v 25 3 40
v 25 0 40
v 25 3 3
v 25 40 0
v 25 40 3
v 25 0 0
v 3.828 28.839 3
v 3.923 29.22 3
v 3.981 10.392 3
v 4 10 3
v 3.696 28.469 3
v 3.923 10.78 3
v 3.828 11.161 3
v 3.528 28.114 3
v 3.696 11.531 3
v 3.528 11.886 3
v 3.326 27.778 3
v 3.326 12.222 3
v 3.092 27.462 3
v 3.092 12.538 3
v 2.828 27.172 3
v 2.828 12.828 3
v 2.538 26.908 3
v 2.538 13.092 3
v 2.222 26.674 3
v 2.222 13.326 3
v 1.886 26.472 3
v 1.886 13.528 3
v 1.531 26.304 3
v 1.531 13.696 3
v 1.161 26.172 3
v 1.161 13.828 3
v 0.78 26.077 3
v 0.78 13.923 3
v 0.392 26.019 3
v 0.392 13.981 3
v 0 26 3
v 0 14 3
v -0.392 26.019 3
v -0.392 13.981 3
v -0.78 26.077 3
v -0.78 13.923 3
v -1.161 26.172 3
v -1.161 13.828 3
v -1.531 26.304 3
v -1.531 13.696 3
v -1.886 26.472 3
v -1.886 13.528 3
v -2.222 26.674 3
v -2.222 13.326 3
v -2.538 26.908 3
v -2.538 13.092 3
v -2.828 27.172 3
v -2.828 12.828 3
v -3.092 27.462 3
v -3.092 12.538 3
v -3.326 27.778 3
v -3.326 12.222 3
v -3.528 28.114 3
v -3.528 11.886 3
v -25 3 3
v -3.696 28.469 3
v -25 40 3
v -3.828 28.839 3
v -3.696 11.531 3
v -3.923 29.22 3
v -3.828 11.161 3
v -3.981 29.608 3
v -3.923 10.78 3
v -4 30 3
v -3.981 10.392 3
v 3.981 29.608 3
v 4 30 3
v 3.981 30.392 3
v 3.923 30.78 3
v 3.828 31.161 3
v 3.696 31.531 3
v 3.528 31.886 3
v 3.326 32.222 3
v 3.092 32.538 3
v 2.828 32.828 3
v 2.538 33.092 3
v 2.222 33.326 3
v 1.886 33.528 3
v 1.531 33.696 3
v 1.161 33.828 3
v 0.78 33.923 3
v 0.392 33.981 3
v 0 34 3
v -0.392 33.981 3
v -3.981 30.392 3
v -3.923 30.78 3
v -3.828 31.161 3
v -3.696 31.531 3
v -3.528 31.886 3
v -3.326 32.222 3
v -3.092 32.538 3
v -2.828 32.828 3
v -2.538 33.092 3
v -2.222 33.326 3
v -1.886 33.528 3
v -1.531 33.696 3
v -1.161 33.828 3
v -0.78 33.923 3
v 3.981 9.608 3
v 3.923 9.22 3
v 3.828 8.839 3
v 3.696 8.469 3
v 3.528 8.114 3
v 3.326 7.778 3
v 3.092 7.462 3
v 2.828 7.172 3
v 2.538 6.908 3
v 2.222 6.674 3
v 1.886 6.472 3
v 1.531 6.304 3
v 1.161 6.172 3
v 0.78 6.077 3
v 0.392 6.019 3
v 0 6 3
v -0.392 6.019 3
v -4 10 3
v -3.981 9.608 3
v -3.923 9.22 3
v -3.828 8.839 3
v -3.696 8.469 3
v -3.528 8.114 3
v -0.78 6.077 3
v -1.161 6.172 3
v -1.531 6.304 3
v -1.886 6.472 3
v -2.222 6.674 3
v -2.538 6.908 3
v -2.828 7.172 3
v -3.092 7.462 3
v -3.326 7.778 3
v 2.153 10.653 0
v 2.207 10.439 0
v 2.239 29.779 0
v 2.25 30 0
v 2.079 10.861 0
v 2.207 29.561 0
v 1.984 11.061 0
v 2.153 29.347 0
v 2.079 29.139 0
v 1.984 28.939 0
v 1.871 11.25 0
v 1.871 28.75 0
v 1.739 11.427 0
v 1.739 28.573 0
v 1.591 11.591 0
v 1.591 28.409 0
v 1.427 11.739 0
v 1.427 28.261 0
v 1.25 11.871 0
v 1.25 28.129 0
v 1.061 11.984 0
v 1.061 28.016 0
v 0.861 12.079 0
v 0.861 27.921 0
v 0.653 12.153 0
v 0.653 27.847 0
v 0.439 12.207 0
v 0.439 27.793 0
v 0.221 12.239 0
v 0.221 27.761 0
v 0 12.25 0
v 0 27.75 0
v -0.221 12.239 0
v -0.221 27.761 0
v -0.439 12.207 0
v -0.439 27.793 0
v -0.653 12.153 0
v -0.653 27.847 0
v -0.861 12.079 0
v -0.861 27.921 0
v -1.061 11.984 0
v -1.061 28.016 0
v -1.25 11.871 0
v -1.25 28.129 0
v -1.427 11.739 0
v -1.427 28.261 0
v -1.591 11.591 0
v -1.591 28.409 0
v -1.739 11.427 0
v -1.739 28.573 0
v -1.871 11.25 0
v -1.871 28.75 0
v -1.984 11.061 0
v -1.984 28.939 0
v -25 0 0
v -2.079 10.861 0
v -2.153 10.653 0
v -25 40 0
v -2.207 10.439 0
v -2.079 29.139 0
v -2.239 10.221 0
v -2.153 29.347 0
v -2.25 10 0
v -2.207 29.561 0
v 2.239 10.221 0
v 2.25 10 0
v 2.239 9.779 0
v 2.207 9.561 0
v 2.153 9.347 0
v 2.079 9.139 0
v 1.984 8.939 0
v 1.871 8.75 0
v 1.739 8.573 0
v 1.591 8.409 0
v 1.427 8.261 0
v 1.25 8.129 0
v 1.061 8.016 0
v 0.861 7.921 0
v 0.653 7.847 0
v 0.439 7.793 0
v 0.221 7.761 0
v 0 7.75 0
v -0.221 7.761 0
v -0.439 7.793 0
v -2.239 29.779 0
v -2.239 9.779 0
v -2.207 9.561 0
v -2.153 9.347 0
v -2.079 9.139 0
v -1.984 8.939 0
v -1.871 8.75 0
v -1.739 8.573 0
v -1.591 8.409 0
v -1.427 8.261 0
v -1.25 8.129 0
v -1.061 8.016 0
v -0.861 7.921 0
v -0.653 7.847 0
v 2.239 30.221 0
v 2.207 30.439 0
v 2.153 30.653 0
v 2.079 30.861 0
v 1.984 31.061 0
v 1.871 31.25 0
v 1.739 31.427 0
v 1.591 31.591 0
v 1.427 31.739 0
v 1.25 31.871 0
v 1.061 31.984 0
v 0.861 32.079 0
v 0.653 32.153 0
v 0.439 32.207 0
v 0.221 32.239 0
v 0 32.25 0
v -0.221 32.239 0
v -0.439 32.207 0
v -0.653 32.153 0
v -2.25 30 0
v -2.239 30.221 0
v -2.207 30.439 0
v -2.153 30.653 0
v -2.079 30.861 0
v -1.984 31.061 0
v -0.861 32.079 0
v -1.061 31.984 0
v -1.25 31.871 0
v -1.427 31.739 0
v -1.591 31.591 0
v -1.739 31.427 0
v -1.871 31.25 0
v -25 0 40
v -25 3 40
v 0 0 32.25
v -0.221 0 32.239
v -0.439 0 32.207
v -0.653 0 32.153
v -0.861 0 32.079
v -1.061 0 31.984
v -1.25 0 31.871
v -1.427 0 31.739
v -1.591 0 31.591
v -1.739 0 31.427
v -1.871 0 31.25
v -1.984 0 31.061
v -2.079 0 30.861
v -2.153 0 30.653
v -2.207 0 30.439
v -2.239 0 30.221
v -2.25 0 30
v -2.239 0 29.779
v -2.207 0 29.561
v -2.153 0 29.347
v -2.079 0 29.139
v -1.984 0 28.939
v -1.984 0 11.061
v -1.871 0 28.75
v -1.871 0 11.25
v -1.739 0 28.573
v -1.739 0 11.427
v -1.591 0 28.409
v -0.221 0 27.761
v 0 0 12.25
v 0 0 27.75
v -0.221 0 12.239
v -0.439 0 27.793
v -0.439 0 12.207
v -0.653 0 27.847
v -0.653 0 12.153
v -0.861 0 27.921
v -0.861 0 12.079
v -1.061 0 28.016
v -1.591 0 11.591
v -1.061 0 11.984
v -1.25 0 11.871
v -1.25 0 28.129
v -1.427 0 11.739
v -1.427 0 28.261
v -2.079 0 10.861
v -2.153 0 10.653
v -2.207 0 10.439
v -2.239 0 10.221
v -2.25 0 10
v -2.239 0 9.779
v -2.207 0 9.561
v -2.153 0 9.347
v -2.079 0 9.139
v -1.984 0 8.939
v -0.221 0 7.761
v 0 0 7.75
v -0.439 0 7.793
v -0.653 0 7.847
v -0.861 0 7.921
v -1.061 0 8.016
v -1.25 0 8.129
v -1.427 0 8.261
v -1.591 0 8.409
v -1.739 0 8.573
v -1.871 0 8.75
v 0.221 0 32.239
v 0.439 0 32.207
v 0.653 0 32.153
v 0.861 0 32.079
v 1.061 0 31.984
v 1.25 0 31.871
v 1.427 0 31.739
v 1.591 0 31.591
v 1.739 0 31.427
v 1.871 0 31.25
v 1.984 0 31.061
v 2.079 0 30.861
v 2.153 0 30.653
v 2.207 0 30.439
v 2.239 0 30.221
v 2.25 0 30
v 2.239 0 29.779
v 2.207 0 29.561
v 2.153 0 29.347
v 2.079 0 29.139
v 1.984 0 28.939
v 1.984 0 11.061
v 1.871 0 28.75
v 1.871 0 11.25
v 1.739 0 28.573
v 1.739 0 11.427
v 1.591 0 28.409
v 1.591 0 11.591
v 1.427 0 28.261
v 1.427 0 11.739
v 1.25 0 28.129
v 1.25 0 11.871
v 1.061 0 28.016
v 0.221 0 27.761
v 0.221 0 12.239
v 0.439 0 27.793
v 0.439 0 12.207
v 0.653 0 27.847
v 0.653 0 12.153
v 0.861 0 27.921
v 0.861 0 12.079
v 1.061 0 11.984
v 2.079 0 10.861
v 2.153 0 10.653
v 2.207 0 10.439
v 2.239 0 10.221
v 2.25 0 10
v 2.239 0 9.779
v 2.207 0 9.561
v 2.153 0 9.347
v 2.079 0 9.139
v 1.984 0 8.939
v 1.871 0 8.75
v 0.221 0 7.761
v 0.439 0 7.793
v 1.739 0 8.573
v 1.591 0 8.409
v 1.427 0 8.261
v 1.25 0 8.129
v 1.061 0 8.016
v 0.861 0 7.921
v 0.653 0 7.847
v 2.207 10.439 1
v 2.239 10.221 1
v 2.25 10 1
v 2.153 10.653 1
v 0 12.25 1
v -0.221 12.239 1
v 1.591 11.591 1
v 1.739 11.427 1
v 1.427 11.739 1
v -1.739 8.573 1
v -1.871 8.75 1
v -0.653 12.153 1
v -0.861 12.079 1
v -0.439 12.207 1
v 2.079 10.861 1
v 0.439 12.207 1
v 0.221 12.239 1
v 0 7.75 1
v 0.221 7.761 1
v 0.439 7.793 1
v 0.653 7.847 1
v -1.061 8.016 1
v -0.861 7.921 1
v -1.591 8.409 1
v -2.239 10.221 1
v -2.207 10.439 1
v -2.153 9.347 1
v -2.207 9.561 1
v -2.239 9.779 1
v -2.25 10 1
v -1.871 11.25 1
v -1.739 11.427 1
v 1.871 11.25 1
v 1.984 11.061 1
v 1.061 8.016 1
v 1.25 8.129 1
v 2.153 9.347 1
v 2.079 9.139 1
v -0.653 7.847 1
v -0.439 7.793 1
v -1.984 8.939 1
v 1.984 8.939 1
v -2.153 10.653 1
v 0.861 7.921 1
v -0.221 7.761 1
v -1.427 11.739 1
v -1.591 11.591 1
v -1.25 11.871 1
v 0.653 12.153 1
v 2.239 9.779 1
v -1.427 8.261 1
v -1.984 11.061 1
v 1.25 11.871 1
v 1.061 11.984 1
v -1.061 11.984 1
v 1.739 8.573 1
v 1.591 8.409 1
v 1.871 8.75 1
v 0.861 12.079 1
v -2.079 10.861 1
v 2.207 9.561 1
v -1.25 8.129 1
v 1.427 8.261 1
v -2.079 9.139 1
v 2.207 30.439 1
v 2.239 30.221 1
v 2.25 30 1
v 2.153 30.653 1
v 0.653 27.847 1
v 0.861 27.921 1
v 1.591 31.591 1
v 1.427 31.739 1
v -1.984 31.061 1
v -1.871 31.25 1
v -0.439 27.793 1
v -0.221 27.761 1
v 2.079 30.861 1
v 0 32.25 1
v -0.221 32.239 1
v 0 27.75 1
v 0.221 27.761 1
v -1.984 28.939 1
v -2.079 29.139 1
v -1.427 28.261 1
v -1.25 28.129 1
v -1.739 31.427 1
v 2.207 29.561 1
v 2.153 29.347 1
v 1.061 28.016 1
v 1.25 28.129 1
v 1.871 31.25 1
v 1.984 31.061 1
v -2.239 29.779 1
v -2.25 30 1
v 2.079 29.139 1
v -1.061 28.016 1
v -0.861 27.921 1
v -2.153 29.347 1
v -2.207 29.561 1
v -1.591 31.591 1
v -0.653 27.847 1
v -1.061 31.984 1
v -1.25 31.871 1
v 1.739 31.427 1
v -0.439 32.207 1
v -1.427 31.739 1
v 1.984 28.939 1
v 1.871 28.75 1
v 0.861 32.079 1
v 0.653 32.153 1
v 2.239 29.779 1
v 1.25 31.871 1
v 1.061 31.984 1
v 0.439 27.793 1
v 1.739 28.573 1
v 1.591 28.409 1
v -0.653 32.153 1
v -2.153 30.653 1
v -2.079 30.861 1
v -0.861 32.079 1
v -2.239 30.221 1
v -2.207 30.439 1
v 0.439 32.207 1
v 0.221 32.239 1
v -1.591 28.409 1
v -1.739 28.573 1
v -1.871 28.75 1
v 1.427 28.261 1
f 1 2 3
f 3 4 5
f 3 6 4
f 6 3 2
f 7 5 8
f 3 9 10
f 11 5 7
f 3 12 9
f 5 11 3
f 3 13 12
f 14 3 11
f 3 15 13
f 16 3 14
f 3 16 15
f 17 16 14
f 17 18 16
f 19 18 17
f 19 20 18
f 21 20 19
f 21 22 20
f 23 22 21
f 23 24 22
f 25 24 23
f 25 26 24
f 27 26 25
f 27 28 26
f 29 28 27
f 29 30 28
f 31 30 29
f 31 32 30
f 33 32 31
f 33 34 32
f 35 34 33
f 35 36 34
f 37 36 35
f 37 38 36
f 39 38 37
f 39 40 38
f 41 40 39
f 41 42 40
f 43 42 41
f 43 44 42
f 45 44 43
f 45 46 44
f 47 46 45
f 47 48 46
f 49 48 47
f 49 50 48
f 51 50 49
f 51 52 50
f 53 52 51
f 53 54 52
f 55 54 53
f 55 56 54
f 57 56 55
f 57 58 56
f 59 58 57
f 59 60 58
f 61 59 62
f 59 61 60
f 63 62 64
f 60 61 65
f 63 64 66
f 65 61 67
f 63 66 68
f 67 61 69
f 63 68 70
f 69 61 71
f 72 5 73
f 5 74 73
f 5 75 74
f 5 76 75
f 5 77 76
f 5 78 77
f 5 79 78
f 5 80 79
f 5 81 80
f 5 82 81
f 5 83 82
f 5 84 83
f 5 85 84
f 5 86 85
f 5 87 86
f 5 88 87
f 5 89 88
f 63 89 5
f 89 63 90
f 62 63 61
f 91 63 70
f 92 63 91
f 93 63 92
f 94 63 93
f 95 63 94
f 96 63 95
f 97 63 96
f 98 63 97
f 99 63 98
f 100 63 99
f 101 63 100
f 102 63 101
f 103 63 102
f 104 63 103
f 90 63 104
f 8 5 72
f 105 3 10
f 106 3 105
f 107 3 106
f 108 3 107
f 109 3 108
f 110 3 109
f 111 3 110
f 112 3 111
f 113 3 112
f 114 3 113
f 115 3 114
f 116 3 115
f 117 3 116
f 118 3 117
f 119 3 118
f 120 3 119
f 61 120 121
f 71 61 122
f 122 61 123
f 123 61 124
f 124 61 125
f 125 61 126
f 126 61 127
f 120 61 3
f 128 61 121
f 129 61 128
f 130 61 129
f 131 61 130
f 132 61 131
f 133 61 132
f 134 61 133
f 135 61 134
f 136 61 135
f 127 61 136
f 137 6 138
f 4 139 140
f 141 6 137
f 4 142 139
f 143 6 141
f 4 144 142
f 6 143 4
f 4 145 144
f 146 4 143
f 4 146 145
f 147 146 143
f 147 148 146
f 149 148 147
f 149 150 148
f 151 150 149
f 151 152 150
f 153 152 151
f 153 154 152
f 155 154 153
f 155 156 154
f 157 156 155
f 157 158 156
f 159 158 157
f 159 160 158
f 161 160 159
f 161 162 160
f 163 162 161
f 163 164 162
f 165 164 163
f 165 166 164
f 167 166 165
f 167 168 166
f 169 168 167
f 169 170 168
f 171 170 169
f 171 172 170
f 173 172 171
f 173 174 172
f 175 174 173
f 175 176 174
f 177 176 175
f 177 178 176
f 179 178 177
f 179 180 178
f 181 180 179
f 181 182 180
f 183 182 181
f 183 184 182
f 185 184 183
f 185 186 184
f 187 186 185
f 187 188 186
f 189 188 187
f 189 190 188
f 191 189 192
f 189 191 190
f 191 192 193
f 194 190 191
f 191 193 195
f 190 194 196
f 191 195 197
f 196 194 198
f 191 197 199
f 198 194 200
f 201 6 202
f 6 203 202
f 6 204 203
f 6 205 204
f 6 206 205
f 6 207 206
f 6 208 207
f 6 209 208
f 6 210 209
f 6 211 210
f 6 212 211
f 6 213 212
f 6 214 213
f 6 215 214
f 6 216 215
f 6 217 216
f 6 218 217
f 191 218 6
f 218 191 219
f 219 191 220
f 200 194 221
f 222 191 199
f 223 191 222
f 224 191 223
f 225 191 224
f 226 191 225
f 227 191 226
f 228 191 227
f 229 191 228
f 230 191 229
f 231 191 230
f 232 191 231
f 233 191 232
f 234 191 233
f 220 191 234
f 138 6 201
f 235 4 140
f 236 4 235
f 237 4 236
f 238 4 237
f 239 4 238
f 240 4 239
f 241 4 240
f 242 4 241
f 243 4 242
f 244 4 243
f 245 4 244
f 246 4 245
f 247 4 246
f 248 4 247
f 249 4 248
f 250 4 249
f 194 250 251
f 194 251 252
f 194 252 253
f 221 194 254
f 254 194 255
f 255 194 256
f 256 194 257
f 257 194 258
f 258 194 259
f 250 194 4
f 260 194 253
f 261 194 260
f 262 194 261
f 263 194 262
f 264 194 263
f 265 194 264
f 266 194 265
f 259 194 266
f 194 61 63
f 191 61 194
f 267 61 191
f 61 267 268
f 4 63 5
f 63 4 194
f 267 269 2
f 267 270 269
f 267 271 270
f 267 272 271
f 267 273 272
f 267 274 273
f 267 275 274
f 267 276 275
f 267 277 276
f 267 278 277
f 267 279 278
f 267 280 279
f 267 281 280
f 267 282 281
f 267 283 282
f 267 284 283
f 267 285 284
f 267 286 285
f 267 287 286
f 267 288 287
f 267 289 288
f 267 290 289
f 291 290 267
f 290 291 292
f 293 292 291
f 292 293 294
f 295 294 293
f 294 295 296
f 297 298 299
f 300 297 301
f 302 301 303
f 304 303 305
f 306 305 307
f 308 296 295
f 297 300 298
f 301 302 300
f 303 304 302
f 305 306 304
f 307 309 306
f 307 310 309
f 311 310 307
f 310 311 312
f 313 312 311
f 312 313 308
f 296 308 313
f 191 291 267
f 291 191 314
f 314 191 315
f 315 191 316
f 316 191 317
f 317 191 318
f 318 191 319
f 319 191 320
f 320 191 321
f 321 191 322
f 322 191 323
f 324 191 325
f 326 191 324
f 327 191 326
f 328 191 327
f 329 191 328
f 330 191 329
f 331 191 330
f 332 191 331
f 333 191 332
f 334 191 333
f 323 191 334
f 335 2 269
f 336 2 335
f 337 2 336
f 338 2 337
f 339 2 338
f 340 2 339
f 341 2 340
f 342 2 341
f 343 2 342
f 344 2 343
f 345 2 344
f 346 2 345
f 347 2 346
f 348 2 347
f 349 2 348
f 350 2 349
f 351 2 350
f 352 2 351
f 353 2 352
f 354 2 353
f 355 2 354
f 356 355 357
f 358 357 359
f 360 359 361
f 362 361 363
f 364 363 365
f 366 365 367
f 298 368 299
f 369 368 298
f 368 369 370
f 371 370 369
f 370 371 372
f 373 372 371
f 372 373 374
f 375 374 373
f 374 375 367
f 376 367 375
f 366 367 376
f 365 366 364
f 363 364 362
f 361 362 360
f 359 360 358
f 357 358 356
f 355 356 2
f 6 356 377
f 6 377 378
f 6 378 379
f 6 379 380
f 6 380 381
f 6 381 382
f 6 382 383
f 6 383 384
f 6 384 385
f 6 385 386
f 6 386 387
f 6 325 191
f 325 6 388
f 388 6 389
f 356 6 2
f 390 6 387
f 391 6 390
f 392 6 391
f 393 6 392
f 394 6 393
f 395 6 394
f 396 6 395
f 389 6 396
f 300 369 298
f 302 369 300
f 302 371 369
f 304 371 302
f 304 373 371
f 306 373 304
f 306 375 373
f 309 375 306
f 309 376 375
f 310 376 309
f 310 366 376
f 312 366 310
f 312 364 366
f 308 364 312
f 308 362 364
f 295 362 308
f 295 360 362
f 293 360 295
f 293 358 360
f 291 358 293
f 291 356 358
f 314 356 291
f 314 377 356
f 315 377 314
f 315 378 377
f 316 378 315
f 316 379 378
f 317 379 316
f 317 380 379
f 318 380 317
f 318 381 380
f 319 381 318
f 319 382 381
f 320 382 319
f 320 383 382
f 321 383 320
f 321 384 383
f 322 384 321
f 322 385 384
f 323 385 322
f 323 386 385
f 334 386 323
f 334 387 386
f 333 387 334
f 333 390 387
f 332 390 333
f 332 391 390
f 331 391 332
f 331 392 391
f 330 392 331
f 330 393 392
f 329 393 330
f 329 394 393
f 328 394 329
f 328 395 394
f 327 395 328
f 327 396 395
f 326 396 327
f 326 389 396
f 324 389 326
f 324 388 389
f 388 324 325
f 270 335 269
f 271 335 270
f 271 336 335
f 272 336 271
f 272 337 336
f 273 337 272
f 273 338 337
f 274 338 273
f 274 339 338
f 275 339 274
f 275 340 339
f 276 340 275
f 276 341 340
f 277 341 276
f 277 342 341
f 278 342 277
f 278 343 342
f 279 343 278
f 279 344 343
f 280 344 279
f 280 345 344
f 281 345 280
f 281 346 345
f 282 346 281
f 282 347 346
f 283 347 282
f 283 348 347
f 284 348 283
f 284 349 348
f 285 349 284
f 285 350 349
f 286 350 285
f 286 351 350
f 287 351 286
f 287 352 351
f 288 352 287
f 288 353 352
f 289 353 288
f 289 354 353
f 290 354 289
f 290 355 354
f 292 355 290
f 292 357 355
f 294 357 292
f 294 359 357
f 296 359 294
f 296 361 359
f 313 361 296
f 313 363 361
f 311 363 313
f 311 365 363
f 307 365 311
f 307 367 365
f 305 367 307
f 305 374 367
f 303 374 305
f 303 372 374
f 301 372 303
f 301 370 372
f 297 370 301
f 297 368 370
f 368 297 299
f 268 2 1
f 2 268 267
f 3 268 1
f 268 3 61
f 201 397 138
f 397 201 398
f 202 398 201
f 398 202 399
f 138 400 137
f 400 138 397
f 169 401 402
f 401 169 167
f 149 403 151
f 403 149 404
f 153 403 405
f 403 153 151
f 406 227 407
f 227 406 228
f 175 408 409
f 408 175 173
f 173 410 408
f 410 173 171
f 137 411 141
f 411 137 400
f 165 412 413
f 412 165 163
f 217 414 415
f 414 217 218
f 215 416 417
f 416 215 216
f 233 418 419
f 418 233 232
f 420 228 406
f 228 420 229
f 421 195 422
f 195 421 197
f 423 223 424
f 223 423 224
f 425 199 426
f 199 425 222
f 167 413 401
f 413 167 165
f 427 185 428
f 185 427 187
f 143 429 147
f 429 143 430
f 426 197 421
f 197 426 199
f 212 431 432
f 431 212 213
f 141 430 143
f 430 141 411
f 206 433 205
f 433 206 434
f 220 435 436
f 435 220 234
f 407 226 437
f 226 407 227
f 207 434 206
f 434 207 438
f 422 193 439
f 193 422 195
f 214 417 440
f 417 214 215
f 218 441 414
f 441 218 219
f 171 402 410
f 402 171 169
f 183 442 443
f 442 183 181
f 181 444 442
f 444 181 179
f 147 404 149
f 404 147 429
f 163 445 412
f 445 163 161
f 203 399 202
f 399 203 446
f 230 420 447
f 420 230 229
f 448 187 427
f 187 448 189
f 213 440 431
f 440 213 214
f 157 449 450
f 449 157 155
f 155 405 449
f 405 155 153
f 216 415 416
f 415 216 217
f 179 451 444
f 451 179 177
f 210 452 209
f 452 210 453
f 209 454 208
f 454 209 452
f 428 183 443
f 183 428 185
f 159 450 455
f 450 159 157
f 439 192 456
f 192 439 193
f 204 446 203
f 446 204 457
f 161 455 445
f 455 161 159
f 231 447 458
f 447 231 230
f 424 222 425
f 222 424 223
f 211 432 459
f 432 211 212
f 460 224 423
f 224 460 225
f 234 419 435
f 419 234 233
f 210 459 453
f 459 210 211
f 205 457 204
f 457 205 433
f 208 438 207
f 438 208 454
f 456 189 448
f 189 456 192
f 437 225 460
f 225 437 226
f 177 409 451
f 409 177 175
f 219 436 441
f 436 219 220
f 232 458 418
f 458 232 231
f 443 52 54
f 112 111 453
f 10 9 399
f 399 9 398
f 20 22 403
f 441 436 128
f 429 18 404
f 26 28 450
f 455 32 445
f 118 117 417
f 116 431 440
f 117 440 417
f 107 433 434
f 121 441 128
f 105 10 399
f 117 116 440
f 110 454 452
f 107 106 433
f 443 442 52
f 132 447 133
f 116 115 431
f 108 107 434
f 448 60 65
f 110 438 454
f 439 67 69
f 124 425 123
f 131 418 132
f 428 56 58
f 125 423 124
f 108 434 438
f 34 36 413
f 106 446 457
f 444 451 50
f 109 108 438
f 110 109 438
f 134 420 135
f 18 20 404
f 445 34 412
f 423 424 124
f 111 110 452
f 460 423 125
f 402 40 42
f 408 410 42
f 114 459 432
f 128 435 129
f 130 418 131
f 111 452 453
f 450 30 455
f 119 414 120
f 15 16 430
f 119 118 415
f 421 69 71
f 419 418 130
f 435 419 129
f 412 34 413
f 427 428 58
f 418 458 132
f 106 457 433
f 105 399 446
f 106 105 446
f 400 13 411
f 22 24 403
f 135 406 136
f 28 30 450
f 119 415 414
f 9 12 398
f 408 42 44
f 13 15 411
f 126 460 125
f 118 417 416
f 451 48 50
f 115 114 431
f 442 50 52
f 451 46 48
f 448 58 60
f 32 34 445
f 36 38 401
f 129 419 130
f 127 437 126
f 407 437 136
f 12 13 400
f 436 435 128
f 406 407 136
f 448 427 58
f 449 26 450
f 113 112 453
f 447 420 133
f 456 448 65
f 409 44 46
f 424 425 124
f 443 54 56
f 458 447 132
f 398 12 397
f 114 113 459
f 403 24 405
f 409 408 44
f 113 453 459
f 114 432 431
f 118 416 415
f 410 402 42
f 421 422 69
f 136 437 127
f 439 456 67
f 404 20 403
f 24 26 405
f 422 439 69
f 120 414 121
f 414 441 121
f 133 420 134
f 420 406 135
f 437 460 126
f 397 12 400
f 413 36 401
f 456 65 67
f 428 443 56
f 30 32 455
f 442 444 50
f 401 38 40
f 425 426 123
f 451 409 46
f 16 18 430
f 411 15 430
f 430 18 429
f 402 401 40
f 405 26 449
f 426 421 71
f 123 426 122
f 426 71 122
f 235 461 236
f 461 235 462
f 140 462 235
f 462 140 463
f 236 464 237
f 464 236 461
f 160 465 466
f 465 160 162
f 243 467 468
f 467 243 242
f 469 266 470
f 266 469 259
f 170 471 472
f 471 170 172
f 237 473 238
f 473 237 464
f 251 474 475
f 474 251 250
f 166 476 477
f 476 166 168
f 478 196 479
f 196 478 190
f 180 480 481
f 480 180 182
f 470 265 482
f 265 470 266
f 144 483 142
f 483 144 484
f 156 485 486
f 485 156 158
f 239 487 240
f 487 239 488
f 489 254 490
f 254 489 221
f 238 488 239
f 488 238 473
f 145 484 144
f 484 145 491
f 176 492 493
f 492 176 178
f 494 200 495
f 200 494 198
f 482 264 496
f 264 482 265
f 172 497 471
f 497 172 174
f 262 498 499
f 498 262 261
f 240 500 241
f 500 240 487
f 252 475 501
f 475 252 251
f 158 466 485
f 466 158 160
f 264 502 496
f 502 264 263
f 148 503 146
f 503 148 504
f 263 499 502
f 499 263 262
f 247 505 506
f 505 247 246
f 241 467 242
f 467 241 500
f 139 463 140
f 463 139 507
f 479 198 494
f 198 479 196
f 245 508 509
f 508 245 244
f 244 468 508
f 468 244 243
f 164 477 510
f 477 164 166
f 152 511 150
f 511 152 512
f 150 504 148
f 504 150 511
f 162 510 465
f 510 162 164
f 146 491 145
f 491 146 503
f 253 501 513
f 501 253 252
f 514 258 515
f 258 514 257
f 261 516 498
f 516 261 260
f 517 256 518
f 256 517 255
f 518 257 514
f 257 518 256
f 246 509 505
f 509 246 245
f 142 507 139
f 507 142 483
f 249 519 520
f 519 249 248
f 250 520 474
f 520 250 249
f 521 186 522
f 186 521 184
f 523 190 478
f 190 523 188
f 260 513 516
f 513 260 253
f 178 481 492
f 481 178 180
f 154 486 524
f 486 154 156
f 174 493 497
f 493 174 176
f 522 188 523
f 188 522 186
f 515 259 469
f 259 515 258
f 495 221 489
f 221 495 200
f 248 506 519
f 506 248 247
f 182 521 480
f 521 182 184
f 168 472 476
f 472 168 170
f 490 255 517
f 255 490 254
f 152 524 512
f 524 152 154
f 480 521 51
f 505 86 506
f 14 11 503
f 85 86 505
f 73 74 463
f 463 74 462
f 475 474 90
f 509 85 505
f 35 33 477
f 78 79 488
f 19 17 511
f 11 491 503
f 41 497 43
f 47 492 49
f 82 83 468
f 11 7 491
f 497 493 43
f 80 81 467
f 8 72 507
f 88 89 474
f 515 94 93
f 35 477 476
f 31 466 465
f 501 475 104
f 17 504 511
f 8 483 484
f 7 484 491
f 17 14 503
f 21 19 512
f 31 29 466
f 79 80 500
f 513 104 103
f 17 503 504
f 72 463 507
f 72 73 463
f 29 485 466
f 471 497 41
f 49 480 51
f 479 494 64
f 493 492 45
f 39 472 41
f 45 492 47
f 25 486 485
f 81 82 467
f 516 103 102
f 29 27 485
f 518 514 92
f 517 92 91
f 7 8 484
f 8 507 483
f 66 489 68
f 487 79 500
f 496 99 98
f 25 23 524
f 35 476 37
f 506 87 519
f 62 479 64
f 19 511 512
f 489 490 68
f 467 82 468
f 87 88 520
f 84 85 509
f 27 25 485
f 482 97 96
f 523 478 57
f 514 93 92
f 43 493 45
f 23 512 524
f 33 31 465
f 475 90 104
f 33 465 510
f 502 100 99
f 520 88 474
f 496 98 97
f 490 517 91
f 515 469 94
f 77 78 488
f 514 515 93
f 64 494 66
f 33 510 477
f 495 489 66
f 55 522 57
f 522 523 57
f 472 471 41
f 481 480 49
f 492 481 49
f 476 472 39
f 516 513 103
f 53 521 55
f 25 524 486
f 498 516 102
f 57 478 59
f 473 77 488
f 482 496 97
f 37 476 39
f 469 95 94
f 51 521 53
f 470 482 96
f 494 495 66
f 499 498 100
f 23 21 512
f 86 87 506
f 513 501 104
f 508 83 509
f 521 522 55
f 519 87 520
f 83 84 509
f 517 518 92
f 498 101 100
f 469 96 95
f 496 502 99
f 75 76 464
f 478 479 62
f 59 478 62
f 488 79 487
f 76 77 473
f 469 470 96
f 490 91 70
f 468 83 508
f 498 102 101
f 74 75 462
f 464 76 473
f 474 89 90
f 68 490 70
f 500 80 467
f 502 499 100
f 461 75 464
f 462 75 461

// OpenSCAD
$fn = 64;

w = 50;
d = 40;
h = 40;
t = 3;

hole_d = 4.5;
cs_d = 8;
cs_depth = 2;

module cs_hole_z(ypos) {
    translate([0, ypos, 0]) {
        cylinder(d = hole_d, h = t);
        translate([0, 0, t - cs_depth])
            cylinder(d1 = hole_d, d2 = cs_d, h = cs_depth);
    }
}

module cs_hole_y(zpos) {
    translate([0, 0, zpos])
        rotate([90, 0, 0]) {
            cylinder(d = hole_d, h = t);
            translate([0, 0, t - cs_depth])
                cylinder(d1 = hole_d, d2 = cs_d, h = cs_depth);
        }
}

difference() {
    union() {
        translate([-w/2, 0, 0]) cube([w, d, t]);
        translate([-w/2, 0, 0]) cube([w, t, h]);
    }

    for (ypos = [10, d - 10])
        cs_hole_z(ypos);

    for (zpos = [10, h - 10])
        cs_hole_y(zpos);
}
